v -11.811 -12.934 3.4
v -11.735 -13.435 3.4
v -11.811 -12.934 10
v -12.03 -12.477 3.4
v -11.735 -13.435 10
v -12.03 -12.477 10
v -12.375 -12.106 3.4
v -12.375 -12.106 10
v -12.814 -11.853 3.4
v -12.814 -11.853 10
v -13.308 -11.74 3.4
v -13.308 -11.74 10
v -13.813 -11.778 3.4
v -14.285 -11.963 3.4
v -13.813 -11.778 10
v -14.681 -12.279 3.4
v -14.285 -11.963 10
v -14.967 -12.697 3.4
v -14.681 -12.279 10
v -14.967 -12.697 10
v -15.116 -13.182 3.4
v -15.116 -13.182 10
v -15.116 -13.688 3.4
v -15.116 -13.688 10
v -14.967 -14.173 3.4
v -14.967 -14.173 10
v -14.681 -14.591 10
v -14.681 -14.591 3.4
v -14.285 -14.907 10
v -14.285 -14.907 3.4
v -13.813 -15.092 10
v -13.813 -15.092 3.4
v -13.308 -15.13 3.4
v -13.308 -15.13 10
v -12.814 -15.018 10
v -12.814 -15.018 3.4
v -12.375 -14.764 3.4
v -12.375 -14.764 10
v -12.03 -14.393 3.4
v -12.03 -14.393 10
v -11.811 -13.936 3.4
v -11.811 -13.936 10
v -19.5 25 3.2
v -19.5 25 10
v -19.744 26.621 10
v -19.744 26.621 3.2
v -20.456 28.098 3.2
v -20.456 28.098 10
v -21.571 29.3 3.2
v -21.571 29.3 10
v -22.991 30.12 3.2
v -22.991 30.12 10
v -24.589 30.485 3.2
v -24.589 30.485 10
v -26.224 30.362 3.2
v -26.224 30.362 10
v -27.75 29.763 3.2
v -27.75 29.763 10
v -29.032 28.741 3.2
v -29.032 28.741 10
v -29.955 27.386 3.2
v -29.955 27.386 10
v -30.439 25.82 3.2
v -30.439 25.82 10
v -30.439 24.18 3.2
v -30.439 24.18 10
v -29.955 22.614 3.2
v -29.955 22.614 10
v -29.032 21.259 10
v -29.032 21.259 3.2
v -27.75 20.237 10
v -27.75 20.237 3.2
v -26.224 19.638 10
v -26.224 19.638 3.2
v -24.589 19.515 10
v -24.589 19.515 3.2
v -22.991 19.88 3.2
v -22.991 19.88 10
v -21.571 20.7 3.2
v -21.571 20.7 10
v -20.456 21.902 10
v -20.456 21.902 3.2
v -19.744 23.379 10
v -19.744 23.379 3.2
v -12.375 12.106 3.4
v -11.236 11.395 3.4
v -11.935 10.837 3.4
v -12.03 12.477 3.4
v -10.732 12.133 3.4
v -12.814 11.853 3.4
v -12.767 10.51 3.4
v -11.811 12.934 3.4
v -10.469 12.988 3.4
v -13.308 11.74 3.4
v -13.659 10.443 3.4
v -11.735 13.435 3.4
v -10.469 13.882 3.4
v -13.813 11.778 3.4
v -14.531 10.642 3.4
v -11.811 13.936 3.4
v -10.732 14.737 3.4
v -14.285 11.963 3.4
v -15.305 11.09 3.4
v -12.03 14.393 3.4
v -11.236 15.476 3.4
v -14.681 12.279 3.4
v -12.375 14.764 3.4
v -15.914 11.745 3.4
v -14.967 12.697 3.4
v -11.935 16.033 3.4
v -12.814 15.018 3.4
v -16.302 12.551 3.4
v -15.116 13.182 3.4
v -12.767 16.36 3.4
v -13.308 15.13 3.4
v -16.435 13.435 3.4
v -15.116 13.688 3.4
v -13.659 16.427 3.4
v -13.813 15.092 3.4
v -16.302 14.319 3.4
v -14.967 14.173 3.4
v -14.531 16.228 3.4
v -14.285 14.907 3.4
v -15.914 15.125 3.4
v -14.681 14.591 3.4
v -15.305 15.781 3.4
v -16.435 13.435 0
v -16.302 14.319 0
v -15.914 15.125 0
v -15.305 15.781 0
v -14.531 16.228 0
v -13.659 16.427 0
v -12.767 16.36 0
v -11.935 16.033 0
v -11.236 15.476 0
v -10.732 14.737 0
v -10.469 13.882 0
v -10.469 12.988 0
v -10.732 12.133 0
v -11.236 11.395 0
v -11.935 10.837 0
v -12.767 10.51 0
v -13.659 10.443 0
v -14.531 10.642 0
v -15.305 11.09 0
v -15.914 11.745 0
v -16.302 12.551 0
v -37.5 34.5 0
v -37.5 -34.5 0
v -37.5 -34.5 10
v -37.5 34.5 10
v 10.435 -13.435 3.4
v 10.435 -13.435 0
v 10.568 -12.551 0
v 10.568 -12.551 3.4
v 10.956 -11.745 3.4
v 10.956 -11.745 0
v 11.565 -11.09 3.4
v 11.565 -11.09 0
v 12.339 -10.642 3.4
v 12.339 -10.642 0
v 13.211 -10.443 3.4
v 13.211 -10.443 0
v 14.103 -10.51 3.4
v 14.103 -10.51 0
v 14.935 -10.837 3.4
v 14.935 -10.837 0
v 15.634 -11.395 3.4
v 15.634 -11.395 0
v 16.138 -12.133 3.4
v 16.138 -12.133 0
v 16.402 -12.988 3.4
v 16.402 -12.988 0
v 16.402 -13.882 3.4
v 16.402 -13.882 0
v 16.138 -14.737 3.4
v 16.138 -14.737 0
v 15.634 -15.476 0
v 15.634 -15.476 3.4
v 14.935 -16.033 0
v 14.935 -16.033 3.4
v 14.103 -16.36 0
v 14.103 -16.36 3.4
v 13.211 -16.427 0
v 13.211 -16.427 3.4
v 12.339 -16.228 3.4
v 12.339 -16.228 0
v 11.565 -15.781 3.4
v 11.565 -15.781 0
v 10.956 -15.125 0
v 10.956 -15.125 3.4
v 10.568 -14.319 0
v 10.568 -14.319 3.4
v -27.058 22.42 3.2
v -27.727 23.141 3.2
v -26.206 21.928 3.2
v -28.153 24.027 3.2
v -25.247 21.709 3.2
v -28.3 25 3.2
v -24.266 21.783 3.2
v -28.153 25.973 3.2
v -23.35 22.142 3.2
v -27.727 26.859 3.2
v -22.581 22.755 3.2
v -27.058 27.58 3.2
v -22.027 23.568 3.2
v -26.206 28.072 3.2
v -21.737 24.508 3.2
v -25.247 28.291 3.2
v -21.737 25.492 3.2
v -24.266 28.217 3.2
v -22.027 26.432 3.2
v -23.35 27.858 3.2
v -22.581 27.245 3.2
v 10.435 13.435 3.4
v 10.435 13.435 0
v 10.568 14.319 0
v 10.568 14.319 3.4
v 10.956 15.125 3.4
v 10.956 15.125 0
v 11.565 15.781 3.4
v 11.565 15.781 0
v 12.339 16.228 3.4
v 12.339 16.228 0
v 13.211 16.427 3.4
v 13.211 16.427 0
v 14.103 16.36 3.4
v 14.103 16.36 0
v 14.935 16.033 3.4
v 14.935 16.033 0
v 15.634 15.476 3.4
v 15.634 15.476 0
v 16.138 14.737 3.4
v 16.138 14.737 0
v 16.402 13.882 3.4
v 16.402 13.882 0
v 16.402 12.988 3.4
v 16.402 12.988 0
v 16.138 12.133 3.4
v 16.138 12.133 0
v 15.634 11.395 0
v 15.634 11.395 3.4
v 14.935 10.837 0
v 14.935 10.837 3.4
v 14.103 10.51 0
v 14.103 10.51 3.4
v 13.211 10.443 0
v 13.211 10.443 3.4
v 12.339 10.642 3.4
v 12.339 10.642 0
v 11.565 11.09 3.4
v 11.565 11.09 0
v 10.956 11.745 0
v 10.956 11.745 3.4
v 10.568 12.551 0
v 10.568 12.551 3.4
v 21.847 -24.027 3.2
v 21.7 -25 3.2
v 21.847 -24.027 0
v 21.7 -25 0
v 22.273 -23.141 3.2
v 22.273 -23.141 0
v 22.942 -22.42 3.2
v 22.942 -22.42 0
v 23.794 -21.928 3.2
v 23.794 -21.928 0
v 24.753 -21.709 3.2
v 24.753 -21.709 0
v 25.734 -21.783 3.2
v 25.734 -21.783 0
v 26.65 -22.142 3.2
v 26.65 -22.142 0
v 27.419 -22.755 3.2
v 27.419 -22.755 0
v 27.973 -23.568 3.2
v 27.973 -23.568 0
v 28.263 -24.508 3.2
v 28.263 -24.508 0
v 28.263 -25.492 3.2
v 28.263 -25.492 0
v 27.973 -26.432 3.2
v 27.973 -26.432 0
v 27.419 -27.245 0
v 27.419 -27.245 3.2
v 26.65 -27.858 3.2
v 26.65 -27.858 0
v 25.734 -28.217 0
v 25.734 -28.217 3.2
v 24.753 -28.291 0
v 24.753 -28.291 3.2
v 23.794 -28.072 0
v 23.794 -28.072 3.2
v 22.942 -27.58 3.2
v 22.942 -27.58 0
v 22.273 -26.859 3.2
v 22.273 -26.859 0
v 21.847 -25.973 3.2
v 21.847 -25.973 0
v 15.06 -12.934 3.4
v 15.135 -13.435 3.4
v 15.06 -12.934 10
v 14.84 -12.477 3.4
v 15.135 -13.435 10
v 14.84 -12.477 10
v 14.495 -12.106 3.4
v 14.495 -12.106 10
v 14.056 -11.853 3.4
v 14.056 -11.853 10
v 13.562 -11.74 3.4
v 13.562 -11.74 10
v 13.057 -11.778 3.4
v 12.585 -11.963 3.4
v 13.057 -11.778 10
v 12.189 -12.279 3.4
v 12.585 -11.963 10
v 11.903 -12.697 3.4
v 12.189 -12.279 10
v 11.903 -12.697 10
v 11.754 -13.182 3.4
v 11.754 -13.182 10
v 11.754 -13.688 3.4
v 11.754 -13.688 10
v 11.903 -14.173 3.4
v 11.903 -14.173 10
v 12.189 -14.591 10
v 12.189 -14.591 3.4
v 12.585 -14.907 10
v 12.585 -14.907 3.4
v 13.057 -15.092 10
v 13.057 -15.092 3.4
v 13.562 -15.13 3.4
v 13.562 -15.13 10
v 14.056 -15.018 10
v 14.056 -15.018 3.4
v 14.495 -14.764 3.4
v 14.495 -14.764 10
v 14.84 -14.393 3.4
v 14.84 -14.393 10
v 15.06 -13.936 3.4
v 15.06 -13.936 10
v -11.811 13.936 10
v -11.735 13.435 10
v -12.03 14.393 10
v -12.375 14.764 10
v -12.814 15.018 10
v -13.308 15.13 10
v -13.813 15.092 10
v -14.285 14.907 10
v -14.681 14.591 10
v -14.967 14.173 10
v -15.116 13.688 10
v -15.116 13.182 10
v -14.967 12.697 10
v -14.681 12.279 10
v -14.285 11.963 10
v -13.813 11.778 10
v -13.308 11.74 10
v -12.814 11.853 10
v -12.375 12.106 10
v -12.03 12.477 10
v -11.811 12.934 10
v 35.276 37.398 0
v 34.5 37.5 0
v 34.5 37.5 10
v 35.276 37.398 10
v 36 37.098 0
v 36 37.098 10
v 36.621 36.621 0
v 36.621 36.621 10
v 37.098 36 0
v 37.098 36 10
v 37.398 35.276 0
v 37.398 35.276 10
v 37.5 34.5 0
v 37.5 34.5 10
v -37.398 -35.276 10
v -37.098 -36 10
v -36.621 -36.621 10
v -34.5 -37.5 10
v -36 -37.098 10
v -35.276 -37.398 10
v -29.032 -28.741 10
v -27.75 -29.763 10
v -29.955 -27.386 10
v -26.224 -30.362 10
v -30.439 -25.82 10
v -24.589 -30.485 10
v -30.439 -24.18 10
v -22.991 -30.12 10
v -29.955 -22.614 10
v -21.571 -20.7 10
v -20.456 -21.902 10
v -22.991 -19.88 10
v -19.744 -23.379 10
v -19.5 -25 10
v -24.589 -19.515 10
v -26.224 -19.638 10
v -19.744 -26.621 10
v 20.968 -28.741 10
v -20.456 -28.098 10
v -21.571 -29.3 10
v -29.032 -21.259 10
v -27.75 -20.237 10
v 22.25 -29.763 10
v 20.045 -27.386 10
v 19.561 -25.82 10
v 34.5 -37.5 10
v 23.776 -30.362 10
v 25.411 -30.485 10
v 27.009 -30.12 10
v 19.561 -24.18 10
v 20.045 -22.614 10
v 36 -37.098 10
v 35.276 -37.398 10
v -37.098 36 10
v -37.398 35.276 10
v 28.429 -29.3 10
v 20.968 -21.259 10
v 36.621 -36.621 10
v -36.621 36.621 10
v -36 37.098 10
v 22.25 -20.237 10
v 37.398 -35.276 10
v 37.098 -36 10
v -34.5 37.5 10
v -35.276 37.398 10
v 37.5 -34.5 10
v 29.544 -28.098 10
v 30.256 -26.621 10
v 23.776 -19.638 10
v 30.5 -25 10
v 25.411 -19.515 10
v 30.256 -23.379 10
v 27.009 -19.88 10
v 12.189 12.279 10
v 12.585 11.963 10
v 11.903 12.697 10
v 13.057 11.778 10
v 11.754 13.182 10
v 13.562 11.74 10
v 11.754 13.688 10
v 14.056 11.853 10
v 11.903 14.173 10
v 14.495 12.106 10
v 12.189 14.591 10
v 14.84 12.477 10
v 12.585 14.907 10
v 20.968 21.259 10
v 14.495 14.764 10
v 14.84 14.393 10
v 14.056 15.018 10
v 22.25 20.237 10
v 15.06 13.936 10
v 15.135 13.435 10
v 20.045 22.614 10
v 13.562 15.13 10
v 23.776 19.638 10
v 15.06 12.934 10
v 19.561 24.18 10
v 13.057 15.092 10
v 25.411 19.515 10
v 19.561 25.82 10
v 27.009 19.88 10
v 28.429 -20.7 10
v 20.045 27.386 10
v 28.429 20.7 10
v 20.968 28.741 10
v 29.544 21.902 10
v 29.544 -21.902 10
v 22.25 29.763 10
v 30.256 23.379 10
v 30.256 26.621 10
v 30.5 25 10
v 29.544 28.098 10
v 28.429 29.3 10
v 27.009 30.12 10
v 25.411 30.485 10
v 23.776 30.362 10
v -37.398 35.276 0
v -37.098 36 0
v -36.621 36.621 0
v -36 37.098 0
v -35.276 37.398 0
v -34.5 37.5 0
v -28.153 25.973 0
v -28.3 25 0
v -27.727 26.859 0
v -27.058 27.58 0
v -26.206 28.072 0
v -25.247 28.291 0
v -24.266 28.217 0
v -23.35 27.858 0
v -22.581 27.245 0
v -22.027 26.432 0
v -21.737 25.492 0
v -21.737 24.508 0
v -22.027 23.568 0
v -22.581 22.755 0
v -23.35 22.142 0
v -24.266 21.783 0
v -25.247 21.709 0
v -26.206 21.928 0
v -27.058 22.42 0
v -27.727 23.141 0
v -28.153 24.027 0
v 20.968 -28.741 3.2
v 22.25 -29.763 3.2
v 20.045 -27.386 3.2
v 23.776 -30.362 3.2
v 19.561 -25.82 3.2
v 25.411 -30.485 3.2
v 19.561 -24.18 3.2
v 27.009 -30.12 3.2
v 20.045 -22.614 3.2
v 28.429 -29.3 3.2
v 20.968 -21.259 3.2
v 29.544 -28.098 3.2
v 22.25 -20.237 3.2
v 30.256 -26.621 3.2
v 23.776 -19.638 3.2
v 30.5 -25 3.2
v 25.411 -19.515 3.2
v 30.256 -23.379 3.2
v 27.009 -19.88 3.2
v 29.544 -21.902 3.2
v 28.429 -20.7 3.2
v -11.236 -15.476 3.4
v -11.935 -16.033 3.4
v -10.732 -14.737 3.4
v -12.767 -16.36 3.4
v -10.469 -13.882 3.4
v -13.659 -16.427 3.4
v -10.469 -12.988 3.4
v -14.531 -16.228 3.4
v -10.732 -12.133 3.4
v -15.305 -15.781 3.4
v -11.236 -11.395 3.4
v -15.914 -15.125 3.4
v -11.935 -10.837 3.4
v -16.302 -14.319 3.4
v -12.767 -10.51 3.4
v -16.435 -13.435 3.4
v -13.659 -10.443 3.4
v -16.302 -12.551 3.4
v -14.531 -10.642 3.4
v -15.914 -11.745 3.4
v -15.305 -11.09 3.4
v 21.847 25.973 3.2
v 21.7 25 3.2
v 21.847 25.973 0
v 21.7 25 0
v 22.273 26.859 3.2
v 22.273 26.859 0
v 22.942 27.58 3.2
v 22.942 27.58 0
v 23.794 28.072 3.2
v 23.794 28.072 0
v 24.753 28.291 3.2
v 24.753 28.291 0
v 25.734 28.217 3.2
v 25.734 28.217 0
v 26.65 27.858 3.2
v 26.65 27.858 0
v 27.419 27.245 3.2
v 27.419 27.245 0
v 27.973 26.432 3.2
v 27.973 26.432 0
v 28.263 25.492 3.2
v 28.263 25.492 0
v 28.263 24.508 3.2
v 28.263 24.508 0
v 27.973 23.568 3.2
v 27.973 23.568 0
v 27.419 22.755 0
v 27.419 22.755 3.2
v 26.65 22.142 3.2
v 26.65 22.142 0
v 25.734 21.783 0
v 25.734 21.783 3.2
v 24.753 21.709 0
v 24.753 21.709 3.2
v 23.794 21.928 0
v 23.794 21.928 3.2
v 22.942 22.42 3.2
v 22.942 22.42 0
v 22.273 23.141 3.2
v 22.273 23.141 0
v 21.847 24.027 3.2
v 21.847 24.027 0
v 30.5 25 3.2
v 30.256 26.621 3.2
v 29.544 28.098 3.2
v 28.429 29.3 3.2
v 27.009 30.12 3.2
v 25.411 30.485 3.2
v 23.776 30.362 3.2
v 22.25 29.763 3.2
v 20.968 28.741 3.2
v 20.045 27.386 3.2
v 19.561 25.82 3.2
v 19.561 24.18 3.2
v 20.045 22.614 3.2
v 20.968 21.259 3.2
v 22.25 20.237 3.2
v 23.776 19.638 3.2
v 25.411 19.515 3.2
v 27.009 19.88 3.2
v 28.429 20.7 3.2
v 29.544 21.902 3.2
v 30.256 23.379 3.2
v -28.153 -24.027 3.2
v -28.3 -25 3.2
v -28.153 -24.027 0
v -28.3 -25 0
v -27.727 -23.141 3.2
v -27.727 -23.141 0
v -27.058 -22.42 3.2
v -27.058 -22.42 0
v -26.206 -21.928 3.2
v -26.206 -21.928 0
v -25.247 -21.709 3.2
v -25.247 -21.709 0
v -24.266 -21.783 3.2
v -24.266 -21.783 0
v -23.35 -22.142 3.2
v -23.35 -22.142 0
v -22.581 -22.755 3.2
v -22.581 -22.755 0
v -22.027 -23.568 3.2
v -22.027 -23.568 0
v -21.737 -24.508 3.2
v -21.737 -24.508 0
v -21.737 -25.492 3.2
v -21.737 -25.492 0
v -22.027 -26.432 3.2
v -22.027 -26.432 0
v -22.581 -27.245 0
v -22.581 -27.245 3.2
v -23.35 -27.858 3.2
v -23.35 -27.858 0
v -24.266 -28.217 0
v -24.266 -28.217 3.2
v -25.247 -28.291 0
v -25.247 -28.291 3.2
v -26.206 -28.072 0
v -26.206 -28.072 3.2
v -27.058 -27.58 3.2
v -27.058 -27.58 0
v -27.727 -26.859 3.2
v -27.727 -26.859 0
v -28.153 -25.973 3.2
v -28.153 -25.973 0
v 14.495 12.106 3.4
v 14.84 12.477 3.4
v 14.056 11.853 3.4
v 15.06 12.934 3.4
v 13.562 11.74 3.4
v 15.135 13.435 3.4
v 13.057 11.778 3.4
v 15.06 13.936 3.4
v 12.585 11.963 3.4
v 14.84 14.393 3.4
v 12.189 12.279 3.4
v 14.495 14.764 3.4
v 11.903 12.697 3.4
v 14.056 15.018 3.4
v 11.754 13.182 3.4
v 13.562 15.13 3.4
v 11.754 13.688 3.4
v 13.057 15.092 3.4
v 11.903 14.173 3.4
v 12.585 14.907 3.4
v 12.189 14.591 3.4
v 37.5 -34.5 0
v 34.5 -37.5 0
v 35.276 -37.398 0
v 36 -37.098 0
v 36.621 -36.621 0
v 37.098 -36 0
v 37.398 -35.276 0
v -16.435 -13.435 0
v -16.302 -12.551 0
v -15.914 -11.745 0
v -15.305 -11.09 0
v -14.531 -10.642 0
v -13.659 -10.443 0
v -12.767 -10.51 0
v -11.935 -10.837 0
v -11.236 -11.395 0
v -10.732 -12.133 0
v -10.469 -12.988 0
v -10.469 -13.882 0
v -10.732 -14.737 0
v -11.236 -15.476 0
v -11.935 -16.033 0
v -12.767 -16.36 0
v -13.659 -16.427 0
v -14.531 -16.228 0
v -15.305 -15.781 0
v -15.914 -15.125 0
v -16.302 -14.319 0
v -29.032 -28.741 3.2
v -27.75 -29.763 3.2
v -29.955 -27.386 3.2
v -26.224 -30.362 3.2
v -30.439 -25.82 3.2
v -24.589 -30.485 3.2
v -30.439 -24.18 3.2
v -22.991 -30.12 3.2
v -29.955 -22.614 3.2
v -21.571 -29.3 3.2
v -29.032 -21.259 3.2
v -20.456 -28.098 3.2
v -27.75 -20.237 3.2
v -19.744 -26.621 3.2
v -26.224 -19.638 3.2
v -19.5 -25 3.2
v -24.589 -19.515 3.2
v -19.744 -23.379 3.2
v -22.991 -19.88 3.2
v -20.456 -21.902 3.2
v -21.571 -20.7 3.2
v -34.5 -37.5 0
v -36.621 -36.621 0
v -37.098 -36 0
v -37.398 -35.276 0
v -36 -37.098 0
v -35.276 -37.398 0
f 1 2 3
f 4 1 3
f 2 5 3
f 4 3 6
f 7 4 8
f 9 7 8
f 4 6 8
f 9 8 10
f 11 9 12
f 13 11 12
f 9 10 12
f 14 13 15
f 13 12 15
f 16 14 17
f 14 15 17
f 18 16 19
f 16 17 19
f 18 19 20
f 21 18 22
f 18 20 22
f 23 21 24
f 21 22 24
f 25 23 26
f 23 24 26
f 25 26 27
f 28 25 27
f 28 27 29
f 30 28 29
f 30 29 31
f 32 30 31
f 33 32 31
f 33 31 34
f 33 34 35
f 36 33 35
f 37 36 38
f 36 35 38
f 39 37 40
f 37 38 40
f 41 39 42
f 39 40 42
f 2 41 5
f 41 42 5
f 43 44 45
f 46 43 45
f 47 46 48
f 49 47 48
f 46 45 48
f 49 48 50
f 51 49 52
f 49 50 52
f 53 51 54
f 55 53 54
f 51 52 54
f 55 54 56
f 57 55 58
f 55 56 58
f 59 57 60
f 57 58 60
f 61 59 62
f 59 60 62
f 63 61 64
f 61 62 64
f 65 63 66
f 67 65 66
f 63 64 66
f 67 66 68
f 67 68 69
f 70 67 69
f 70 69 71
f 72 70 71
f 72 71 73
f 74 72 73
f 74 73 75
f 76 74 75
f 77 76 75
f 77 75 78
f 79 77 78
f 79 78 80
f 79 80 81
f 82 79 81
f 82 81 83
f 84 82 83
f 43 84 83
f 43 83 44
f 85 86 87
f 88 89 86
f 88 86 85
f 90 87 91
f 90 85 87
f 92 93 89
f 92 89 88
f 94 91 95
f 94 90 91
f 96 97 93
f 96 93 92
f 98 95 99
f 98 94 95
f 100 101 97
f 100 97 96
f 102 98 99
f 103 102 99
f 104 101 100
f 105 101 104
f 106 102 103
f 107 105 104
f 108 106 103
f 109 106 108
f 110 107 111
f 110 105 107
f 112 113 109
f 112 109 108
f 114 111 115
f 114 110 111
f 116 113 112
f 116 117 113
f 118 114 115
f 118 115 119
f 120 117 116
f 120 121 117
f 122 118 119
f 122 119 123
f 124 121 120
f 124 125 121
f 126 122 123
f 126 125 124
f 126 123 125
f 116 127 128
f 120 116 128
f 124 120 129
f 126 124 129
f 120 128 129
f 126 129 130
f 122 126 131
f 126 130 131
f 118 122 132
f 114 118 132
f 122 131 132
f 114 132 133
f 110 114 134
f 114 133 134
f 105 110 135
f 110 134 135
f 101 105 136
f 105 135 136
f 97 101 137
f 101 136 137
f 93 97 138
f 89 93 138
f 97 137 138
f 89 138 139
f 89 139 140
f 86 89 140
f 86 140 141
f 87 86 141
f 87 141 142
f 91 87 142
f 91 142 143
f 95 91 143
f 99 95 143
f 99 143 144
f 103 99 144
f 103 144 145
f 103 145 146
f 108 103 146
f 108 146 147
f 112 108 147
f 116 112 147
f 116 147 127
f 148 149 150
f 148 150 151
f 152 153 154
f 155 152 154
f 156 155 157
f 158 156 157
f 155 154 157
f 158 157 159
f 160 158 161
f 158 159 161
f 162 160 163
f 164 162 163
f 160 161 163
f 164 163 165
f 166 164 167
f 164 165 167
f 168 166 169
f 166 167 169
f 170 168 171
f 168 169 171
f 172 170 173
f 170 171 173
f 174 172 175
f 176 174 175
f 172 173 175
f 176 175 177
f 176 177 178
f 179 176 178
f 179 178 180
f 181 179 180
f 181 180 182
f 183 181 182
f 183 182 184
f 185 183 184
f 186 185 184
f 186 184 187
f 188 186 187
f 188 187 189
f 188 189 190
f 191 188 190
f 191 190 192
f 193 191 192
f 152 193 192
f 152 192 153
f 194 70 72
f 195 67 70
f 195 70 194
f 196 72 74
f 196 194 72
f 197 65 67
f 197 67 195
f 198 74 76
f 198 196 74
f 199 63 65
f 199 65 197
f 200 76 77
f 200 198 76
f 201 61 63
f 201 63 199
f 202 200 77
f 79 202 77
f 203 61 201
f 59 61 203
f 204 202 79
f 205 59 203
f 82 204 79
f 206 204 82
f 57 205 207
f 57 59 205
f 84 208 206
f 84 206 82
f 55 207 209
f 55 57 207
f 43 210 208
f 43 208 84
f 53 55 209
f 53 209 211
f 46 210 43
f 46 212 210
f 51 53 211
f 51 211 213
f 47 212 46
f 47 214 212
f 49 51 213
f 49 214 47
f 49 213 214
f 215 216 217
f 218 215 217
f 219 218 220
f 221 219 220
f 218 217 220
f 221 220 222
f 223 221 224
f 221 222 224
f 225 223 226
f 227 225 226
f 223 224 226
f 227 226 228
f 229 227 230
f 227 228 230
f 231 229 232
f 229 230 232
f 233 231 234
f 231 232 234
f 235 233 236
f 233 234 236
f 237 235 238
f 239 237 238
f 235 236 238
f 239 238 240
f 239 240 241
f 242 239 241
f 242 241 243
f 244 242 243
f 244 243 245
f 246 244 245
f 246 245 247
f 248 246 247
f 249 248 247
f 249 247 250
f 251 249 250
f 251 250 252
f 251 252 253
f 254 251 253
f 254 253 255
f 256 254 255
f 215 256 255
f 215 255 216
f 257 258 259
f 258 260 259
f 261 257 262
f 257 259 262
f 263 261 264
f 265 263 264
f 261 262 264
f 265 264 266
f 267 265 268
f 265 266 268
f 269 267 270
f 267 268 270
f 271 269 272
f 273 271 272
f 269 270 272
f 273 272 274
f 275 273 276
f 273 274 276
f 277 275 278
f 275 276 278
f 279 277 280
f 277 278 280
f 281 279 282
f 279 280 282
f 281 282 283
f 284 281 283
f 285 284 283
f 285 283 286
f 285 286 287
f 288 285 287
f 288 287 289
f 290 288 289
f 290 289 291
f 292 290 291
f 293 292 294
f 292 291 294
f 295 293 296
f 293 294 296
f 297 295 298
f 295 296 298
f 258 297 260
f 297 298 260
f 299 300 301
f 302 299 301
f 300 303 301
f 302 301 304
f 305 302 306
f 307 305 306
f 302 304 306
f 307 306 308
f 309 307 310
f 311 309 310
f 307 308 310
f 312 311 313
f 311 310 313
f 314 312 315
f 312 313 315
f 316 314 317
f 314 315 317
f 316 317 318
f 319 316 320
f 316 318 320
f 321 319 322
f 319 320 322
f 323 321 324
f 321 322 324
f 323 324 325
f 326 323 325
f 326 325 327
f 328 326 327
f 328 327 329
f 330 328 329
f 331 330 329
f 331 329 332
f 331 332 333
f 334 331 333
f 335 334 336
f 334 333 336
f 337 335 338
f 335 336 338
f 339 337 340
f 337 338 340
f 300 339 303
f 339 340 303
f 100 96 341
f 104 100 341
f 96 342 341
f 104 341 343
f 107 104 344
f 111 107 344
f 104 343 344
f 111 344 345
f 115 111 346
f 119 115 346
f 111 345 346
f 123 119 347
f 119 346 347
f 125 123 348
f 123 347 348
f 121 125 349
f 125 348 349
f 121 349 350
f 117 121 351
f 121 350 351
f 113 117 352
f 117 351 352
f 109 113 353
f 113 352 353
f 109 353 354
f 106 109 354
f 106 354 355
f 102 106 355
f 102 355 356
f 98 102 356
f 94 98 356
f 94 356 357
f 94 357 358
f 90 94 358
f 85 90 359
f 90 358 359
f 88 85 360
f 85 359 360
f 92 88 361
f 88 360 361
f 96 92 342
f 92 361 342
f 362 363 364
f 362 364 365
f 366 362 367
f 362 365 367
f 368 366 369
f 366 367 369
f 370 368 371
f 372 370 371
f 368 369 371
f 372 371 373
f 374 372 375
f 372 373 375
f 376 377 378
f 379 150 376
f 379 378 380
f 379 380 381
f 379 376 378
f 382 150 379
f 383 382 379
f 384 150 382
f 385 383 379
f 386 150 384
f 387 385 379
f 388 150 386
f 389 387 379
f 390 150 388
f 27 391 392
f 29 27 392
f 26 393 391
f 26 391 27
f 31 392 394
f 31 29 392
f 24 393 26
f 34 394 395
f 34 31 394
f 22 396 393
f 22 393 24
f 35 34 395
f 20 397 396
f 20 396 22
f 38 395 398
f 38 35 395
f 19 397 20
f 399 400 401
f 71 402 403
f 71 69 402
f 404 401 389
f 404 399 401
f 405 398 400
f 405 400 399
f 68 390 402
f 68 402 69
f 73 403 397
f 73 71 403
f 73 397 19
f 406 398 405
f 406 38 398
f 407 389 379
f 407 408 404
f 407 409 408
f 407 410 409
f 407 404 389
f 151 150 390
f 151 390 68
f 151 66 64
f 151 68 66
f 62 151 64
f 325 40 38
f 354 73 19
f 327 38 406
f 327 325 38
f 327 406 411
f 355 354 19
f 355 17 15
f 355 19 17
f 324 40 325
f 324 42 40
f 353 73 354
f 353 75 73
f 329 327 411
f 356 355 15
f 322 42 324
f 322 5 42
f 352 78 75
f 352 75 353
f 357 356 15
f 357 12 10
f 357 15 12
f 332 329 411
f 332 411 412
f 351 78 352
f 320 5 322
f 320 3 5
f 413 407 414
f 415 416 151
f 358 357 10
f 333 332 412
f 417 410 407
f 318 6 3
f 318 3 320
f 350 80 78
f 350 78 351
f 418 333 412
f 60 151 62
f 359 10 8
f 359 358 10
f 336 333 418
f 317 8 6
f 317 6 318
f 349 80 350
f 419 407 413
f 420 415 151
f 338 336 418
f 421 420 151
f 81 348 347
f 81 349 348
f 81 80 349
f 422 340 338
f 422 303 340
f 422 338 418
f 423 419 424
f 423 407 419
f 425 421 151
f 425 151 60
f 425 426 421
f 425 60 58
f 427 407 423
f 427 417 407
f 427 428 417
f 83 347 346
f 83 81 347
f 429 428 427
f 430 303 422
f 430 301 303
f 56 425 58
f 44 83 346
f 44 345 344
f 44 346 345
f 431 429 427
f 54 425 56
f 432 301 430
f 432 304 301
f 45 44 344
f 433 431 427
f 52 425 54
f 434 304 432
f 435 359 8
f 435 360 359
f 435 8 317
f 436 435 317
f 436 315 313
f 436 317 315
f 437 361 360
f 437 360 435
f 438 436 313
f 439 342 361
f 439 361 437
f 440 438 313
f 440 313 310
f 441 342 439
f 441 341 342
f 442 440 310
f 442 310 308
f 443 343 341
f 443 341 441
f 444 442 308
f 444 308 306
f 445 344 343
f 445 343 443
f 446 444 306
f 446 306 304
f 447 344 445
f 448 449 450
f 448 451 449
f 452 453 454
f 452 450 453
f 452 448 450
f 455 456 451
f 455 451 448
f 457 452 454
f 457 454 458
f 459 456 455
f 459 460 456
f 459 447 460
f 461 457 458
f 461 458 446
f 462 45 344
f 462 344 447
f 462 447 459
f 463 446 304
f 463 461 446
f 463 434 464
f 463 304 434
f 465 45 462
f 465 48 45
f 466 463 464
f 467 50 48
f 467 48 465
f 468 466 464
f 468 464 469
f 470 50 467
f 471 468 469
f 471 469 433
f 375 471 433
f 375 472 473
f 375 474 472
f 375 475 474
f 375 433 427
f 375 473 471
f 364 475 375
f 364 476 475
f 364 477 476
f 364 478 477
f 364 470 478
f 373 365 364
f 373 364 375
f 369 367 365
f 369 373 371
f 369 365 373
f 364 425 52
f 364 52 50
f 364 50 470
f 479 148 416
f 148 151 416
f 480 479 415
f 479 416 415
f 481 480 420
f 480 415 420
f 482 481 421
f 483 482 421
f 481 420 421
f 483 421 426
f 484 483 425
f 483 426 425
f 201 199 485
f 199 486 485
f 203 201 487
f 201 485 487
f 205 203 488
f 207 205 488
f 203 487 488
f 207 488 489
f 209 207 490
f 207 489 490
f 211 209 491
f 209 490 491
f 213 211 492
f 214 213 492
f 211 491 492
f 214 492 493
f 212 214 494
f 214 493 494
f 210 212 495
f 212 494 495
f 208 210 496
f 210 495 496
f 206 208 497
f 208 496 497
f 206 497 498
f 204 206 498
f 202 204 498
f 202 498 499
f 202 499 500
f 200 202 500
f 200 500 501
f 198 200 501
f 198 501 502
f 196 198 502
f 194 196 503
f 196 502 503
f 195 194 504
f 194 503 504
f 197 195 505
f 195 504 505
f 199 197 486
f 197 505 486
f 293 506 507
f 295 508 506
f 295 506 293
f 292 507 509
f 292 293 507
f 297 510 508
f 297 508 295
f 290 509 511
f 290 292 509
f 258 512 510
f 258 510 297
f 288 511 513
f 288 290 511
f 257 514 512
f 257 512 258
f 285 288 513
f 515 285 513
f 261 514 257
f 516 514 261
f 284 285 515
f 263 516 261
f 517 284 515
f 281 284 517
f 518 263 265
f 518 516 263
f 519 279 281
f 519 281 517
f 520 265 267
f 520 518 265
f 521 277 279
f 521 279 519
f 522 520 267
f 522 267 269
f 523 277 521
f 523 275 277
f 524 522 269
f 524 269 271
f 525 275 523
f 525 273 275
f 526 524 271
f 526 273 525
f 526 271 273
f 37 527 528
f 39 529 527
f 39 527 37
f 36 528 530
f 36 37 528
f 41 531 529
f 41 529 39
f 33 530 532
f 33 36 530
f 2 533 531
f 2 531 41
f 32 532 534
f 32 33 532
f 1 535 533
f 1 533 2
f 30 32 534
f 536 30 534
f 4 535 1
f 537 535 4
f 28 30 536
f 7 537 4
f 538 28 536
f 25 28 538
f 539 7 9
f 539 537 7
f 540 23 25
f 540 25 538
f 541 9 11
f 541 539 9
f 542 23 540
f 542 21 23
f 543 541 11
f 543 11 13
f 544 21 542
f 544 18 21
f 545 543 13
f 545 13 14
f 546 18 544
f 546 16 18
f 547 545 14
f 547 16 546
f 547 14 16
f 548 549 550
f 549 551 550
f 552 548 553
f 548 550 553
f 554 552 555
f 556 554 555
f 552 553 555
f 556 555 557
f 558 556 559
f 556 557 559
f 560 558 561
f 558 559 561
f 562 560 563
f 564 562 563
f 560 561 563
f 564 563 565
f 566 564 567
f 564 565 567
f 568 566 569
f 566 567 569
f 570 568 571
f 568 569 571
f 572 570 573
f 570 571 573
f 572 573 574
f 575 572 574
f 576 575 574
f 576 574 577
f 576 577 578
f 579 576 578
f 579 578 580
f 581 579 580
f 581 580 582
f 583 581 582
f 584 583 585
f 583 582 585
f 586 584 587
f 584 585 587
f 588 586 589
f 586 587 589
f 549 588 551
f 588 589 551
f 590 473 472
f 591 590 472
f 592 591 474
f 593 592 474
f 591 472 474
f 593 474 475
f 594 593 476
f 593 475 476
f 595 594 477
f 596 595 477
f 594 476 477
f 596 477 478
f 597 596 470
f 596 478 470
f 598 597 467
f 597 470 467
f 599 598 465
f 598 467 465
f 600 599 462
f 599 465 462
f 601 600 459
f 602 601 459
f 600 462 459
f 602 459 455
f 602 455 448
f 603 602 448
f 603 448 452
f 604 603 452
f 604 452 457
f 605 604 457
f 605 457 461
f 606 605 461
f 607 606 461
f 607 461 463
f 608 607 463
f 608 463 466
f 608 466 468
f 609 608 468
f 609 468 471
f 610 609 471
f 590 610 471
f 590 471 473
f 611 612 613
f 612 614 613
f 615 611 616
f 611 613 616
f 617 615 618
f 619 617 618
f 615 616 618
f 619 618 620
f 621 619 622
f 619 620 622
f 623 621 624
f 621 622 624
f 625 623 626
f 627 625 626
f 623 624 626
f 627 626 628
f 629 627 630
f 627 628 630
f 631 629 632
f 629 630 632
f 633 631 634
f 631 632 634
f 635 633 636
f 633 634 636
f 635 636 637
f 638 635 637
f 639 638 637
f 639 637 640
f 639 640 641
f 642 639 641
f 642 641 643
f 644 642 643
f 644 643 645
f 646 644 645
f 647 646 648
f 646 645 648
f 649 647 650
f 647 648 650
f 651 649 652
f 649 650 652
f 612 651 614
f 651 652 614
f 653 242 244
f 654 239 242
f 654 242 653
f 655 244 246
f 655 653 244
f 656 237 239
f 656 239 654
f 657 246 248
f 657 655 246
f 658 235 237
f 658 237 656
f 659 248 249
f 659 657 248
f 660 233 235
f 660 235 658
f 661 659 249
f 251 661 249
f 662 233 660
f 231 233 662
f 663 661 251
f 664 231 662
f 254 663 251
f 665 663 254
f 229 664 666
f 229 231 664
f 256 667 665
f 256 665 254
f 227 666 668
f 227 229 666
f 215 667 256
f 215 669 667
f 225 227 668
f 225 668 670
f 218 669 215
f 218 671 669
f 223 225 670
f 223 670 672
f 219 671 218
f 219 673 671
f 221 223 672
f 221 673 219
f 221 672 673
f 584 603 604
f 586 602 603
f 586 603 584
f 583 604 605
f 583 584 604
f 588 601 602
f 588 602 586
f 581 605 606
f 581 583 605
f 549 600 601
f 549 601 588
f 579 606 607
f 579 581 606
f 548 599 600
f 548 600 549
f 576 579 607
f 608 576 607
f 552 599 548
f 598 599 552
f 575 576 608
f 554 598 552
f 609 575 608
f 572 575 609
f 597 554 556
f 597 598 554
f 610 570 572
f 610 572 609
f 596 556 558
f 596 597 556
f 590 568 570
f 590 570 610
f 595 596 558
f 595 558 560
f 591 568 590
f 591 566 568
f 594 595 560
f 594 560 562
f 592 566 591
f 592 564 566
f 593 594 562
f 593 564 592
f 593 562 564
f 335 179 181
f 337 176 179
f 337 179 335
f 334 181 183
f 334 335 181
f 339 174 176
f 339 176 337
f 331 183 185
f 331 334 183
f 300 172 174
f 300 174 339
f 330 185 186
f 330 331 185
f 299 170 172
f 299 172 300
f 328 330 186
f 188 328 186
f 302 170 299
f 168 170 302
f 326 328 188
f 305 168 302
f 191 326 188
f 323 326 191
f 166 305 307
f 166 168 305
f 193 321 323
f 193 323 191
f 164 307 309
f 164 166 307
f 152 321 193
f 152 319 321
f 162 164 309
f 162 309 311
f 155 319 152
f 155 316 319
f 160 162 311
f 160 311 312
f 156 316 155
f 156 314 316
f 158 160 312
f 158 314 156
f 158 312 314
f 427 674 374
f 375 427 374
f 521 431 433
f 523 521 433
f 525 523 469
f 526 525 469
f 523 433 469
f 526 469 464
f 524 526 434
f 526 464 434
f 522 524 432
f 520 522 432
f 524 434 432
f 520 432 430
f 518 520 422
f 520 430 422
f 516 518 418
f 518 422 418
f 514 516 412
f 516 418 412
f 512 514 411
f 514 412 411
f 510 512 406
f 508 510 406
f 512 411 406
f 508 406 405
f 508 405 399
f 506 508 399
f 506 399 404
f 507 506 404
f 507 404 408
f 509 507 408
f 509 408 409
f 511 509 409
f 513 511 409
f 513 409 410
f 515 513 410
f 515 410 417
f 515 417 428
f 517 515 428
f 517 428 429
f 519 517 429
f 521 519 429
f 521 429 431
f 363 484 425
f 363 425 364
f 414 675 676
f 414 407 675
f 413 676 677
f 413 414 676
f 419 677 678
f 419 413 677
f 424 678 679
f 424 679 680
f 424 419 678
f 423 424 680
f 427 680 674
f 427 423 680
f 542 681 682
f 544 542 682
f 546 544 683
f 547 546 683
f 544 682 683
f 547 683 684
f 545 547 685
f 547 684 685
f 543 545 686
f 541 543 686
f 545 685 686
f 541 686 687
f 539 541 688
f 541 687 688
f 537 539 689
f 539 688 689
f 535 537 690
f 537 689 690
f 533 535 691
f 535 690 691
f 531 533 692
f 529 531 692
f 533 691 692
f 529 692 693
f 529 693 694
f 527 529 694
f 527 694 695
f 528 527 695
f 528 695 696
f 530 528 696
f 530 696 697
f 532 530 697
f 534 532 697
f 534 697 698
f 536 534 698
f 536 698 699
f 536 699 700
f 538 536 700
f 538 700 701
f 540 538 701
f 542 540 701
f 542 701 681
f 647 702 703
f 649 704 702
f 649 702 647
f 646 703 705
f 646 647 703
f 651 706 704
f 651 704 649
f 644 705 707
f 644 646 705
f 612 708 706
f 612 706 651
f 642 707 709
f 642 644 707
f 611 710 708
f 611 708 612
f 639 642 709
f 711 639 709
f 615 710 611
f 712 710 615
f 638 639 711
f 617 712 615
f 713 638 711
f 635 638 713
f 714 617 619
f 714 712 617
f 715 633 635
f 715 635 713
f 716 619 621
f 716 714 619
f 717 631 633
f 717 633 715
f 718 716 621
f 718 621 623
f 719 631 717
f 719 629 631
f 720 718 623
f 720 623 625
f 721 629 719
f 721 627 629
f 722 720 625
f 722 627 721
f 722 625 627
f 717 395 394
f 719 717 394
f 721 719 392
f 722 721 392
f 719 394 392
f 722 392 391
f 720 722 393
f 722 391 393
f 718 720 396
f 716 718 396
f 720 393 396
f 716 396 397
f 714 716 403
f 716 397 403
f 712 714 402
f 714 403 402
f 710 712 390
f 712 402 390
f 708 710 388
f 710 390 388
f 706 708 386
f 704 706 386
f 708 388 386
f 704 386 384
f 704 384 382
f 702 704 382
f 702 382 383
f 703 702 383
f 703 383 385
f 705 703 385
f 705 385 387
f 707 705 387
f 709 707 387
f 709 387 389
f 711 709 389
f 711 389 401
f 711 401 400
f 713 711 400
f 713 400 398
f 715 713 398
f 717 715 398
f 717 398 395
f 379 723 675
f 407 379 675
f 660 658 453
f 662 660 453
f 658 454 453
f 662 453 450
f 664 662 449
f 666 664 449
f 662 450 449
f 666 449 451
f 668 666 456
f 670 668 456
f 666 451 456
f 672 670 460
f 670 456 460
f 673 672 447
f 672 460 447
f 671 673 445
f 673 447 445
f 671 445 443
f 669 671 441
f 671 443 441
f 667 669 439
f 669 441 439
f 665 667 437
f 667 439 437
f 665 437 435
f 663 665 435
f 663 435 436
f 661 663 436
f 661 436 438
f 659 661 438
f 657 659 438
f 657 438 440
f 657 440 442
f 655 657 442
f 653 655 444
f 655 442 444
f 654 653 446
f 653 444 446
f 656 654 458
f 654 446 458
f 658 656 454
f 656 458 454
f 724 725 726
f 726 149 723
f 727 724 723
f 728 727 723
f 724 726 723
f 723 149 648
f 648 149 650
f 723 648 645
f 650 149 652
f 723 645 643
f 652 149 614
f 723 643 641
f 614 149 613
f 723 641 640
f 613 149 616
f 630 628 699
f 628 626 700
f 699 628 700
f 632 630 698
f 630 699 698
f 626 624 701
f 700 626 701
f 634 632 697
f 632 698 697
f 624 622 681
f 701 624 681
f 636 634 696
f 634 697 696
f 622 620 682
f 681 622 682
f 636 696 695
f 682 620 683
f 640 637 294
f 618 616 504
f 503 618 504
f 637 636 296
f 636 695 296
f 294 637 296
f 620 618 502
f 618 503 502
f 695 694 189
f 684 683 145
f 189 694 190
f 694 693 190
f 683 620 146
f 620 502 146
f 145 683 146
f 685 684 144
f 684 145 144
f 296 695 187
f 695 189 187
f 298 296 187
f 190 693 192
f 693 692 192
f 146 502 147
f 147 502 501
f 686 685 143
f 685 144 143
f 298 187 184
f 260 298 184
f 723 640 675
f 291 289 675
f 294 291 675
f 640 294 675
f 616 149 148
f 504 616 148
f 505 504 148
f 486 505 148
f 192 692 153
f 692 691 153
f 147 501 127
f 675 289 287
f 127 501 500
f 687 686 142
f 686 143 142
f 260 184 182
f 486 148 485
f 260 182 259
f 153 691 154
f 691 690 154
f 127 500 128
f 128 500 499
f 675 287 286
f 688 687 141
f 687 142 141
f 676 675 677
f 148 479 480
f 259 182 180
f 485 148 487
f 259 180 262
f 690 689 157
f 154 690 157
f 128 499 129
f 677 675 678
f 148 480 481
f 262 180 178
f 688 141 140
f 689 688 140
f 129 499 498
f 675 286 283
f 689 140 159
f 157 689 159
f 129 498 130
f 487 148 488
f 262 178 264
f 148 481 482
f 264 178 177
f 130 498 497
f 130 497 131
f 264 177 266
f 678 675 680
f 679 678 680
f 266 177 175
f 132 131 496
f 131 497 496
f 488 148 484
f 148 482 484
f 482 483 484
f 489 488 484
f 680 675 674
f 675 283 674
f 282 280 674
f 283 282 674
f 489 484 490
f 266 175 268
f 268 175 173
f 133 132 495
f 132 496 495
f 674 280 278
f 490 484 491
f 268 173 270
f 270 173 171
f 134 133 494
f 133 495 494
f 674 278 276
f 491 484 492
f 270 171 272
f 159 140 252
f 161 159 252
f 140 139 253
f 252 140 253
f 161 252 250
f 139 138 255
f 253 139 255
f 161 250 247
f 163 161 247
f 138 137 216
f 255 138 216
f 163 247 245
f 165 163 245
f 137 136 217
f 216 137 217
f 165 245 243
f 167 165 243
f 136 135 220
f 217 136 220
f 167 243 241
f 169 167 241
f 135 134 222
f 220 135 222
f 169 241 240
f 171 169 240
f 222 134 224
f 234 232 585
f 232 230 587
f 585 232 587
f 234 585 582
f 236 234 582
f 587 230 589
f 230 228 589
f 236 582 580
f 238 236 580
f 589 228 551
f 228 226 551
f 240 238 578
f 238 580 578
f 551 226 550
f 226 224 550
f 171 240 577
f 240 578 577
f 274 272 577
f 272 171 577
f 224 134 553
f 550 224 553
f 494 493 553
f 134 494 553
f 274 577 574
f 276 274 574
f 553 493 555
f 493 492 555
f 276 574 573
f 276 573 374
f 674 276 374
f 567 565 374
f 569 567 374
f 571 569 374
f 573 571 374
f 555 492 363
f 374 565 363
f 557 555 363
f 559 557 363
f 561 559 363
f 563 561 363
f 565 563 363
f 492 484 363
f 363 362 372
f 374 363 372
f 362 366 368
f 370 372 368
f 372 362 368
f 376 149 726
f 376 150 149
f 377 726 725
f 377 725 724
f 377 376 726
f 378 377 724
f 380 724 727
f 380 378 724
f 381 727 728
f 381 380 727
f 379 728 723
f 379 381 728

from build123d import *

# Parameters (mm, degrees)
SKETCH_1_W                = 75
SKETCH_1_H                = 75
EXTRUDE_1_DEPTH           = 10
HOLE_WIZARD_1_D           = 6.6
HOLE_WIZARD_1_DEPTH       = 15
HOLE_WIZARD_1_CBORE_D     = 11
HOLE_WIZARD_1_CBORE_DEPTH = 6.8
HOLE_WIZARD_1_TIP         = 1.982840043
FILLET_1_R                = 3
HOLE_WIZARD_2_D           = 3.4
HOLE_WIZARD_2_CBORE_D     = 6
HOLE_WIZARD_2_CBORE_DEPTH = 3.4


with BuildPart() as part:
    # 草图1 → 凸台-拉伸1 (new body)
    with BuildSketch(Plane.XY):
        Rectangle(SKETCH_1_W, SKETCH_1_H)
    extrude(amount=EXTRUDE_1_DEPTH)

    # 打孔尺寸(%根据)内六角圆柱头螺钉的类型1
    with Locations(Plane(origin=(-25, 25, 10), x_dir=(1, 0, 0), z_dir=(0, 0, 1))):
        with Locations((0, 0), (0, -50), (50, -50), (50, 0)):
            CounterBoreHole(HOLE_WIZARD_1_D / 2, HOLE_WIZARD_1_CBORE_D / 2, HOLE_WIZARD_1_CBORE_DEPTH, depth=HOLE_WIZARD_1_DEPTH)
            with Locations((0, 0, -(HOLE_WIZARD_1_DEPTH + HOLE_WIZARD_1_TIP / 2))):  # 118° drill point
                Cone(0, HOLE_WIZARD_1_D / 2, HOLE_WIZARD_1_TIP, mode=Mode.SUBTRACT)

    # 圆角1
    fillet_1_edges = [part.edges().sort_by_distance(p)[0] for p in [
        (37.5, -37.5, 5),
        (-37.5, -37.5, 5),
        (-37.5, 37.5, 5),
        (37.5, 37.5, 5),
    ]]
    fillet(fillet_1_edges, radius=FILLET_1_R)

    # 打孔尺寸(%根据)内六角圆柱头螺钉的类型2 (through all)
    with Locations(Plane(origin=(0, 0, 0), x_dir=(-1, 0, 0), z_dir=(0, 0, -1))):
        with Locations((13.435028843, -13.435028843), (13.435028843, 13.435028843), (-13.435028843, 13.435028843), (-13.435028843, -13.435028843)):
            CounterBoreHole(HOLE_WIZARD_2_D / 2, HOLE_WIZARD_2_CBORE_D / 2, HOLE_WIZARD_2_CBORE_DEPTH)


solid = part.part
